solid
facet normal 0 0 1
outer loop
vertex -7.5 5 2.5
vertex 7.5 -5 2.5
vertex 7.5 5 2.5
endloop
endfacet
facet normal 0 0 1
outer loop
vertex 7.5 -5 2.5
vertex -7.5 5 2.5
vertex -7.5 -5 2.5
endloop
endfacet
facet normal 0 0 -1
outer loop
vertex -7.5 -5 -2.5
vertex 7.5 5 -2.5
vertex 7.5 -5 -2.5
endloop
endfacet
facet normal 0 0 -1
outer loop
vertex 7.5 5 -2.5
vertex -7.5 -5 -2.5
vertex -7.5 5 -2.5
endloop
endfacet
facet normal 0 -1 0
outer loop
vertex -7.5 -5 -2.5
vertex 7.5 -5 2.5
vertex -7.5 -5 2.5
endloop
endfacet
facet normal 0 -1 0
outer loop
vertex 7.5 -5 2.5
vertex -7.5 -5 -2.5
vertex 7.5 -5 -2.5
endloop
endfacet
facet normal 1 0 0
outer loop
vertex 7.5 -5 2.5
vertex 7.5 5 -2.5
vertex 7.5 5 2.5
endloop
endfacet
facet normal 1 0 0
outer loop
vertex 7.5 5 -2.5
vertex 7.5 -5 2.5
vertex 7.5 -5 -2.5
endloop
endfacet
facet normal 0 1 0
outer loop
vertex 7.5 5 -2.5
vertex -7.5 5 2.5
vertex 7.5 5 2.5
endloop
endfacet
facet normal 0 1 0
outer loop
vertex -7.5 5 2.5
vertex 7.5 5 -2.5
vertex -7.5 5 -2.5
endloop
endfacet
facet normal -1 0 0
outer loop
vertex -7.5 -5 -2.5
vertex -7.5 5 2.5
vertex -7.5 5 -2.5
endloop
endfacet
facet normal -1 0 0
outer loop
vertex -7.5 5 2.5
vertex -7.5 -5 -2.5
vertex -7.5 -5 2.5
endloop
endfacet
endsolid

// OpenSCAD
/* 
a small cube to start with 
... followed by some alterations
*/
cube 
( 
        1/2 * [ 30, 20, 10 ]
    ,   true 
);
